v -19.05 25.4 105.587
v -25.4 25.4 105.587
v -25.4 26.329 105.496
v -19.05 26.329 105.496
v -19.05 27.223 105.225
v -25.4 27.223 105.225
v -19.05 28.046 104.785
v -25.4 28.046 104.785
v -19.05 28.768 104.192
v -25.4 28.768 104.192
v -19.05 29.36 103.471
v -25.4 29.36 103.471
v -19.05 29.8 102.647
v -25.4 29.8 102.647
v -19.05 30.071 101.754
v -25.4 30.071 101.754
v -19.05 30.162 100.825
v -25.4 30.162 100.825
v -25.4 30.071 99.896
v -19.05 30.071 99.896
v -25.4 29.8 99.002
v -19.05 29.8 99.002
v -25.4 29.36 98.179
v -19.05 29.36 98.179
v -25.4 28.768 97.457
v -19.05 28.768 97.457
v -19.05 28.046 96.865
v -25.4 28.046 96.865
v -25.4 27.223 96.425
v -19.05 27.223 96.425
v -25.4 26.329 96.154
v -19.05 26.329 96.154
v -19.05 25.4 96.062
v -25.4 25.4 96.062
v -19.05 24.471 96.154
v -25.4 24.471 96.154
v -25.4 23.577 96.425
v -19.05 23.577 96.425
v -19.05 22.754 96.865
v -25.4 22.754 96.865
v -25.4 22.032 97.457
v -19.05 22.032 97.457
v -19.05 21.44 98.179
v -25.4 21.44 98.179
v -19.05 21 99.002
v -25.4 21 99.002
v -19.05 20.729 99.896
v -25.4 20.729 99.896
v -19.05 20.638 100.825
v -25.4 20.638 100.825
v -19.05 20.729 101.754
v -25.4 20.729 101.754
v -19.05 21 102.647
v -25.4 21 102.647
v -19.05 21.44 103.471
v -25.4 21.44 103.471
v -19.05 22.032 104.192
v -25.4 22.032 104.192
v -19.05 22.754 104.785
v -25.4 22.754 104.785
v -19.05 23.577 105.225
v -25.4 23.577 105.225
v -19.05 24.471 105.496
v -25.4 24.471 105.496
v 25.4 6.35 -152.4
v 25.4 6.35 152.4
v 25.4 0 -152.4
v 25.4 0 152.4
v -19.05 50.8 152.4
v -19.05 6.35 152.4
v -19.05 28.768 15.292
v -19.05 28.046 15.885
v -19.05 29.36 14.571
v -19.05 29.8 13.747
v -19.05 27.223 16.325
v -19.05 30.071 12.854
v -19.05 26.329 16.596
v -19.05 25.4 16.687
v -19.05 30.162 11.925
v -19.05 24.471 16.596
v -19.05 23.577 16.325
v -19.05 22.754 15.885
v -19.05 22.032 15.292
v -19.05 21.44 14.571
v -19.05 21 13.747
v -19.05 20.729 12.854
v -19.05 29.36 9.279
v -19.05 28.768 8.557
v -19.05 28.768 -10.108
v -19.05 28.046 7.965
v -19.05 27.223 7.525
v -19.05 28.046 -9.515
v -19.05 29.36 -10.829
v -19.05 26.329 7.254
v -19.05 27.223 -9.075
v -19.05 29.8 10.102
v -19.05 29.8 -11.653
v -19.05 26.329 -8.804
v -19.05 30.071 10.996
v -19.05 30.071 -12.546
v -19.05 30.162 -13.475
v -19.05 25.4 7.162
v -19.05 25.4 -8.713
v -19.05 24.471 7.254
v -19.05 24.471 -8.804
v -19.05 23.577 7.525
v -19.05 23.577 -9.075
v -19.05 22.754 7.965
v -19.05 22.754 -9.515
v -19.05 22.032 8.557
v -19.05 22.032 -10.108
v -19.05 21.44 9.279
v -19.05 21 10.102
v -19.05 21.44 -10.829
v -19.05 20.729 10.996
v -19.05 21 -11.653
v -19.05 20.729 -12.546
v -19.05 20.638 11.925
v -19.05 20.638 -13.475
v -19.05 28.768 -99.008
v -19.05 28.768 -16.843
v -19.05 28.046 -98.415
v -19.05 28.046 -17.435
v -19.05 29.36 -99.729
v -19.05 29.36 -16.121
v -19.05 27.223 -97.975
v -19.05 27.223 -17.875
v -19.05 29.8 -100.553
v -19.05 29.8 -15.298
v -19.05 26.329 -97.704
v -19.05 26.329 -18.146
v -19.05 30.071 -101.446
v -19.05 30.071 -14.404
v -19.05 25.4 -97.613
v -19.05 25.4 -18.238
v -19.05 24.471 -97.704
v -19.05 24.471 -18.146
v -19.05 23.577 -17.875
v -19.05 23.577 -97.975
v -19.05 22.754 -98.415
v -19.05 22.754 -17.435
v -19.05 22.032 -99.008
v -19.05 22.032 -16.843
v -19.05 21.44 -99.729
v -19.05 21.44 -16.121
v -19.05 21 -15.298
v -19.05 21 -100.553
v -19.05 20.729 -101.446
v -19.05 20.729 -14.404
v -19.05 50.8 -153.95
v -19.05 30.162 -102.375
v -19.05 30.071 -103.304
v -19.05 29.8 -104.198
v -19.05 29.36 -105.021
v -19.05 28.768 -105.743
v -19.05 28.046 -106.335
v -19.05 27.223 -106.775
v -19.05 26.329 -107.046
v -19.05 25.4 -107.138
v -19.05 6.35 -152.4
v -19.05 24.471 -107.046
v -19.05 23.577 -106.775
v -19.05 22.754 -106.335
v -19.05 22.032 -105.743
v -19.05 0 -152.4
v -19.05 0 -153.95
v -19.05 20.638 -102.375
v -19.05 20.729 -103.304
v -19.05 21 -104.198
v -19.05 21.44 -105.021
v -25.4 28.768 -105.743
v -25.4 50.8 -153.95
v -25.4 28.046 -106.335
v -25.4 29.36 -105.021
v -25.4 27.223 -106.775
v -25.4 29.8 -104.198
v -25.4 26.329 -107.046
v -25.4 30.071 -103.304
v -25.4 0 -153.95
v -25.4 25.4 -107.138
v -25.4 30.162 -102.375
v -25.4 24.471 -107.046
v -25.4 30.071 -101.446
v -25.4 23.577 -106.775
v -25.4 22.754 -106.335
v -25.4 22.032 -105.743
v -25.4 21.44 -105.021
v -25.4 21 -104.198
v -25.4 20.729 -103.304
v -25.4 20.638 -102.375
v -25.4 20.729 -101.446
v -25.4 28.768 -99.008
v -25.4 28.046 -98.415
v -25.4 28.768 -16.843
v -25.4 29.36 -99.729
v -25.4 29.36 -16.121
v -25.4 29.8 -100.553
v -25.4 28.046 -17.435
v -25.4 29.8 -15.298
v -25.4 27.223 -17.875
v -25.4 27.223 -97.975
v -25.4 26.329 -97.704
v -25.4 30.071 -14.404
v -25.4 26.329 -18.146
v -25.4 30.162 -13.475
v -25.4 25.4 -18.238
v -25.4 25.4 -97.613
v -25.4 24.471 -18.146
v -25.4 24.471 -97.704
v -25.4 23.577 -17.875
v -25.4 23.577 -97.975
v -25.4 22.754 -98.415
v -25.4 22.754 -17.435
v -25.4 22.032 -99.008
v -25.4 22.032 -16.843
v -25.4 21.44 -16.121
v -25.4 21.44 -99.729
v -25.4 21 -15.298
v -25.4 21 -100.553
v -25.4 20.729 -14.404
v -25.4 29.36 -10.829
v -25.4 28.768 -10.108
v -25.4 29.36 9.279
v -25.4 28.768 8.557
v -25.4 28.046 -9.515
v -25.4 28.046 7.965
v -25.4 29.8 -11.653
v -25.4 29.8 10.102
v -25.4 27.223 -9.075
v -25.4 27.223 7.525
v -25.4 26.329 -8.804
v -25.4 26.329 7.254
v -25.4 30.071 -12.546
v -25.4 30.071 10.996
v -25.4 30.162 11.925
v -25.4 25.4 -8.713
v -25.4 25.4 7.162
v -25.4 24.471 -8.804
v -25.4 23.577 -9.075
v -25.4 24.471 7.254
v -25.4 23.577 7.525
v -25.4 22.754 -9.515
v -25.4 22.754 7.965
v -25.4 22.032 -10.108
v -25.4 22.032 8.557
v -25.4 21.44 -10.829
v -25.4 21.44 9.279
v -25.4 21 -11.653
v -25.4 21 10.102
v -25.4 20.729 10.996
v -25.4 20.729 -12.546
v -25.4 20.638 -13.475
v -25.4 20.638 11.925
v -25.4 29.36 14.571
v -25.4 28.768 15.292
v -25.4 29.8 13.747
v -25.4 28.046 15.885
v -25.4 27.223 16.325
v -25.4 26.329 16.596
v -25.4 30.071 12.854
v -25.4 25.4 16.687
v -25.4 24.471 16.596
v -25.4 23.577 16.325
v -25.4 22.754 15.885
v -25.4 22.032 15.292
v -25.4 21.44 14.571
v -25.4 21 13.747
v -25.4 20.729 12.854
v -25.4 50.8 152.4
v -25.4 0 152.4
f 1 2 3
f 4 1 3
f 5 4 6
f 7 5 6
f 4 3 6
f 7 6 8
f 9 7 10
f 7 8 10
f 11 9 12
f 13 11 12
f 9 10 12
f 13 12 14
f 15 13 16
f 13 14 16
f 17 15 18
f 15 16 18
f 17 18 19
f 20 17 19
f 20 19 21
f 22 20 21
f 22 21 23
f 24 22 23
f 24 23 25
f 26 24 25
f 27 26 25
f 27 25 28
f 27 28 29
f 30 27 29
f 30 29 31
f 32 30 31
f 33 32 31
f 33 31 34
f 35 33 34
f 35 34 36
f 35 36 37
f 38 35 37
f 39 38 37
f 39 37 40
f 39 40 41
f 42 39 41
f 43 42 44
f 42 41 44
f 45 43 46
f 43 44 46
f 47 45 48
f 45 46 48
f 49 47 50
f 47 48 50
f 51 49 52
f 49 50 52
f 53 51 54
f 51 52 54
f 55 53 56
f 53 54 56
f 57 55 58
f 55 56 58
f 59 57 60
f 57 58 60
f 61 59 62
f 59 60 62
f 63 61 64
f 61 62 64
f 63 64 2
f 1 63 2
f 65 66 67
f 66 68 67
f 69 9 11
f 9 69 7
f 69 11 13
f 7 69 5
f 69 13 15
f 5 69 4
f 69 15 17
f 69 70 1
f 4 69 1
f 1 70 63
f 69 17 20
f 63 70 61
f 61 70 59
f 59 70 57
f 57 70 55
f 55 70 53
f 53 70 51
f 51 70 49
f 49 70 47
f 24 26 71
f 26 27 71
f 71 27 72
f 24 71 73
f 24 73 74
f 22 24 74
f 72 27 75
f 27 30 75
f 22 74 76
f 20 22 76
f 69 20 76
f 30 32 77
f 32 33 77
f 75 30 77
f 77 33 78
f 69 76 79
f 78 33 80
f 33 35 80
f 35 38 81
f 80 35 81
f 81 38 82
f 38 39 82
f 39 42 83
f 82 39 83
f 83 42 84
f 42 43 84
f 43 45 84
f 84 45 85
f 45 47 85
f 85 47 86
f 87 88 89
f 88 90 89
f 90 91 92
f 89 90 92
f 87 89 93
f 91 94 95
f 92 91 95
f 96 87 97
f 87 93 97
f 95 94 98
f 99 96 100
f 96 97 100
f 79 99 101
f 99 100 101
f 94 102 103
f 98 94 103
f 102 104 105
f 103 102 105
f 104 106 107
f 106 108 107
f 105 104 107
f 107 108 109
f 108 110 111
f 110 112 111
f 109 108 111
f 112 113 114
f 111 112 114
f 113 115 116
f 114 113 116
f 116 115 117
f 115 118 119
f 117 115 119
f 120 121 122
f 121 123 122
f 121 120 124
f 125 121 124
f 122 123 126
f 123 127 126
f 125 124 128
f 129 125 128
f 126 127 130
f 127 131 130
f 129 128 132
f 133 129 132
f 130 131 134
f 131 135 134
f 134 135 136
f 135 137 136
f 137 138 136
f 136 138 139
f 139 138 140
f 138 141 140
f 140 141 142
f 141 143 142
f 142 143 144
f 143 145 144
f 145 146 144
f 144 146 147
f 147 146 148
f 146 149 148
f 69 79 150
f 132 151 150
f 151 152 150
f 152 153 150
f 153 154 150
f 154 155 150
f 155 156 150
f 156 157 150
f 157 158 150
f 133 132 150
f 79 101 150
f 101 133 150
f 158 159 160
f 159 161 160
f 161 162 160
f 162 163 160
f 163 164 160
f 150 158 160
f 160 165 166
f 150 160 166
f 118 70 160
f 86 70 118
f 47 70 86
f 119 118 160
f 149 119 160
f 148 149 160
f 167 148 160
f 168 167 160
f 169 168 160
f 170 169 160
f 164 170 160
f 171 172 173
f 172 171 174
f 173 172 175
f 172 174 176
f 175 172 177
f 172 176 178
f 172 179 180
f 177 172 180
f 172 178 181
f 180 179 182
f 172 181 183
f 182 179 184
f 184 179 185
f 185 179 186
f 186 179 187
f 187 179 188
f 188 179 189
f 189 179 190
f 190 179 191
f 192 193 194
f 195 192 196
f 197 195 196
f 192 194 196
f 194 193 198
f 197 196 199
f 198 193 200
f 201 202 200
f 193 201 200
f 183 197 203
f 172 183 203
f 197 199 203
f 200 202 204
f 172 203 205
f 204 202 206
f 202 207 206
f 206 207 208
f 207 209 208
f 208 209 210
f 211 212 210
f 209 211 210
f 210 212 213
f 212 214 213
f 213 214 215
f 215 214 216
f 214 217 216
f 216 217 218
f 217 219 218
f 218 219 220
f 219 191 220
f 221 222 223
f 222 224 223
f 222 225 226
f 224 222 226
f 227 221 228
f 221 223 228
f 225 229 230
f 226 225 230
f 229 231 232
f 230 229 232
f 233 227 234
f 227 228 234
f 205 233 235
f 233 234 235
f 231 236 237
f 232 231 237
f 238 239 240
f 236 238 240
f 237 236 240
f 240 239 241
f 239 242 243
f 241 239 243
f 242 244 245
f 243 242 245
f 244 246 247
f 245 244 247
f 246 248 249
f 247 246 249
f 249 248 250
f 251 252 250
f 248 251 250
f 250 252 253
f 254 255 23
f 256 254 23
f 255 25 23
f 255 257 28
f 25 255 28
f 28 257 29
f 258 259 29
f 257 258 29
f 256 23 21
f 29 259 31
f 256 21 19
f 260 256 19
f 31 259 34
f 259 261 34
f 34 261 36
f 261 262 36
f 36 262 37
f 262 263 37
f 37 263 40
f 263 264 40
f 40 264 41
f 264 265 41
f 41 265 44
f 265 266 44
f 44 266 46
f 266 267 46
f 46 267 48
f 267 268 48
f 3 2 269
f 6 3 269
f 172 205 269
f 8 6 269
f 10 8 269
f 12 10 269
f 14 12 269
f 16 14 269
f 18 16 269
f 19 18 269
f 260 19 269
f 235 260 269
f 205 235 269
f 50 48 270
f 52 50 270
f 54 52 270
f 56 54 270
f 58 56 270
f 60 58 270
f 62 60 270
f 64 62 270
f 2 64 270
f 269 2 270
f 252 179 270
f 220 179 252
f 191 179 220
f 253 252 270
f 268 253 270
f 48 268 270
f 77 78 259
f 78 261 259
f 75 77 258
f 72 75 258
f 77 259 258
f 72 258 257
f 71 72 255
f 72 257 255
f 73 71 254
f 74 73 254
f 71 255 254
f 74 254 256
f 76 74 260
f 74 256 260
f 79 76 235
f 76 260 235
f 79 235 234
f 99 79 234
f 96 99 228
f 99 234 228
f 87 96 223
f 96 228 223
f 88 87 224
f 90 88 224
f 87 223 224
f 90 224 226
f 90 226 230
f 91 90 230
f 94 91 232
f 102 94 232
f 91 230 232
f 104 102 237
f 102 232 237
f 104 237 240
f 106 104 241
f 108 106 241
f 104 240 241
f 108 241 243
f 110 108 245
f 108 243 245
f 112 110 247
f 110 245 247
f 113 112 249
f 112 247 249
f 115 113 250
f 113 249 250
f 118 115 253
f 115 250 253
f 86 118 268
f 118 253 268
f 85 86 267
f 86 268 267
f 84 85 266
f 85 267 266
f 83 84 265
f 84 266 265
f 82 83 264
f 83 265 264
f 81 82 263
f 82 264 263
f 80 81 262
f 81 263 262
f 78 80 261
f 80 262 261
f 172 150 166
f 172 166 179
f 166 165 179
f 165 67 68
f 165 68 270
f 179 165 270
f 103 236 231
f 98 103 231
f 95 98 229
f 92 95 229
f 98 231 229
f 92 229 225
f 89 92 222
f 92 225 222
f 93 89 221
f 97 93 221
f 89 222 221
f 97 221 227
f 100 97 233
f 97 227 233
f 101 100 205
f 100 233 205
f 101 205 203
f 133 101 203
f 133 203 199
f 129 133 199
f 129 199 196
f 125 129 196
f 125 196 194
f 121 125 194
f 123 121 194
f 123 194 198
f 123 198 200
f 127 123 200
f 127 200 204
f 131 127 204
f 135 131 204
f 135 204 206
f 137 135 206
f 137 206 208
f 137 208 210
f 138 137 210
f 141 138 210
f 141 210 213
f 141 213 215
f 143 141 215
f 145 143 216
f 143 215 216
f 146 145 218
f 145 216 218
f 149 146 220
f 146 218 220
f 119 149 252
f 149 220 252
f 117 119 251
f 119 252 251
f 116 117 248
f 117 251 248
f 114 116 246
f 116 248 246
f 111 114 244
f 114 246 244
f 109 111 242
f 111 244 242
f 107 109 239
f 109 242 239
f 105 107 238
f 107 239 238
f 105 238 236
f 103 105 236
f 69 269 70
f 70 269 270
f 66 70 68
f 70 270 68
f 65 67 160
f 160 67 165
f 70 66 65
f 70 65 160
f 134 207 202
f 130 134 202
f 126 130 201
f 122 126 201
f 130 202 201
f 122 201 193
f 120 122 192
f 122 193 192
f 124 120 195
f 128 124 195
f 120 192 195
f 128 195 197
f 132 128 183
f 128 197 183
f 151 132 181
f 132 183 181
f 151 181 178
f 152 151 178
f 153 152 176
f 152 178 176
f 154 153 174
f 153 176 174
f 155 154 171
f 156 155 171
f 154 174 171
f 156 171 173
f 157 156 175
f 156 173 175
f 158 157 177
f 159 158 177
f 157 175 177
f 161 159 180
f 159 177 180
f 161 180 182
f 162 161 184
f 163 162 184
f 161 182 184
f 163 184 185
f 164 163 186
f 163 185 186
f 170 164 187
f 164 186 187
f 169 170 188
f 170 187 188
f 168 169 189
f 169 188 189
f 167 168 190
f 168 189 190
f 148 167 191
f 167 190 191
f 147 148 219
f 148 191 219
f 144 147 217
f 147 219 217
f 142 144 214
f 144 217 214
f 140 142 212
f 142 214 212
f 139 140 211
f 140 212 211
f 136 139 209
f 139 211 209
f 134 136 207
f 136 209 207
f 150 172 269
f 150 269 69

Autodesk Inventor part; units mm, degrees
ref_plane "YZ Plane" through (0, 0, 0) normal (1, 0, 0) x (0, 1, 0)
ref_plane "XZ Plane" through (0, 0, 0) normal (0, 1, 0) x (-1, 0, 0)
ref_plane "XY Plane" through (0, 0, 0) normal (0, 0, 1) x (1, 0, 0)
sketch "Sketch1" plane through (0, 0, 0) normal (0, 1, 0) x (-1, 0, 0)
  line L0 (25.4, 152.4) -> (-25.4, 152.4)
  line L1 (-25.4, 152.4) -> (-25.4, -152.4)
  line L2 (-25.4, -152.4) -> (25.4, -152.4)
  line L3 (25.4, -152.4) -> (25.4, 152.4)
  point P0 (0, 0)
  dimension "d0" = 50.8
  dimension "d1" = 304.8
  dimension "d2" = 152.4
  dimension "d3" = 25.4
extrude "Extrusion1" add sketch "Sketch1" along normal blind 6.35
sketch "Sketch2" plane through (0, 0, 0) normal (0, -1, 0) x (1, 0, 0)
  line L0 (-25.4, -152.4) -> (-25.4, 152.4) projected
  line L1 (-25.4, 152.4) -> (-19.05, 152.4)
  line L2 (-19.05, 152.4) -> (-19.05, -153.9502)
  line L3 (-19.05, -153.9502) -> (-25.4, -153.9502)
  line L4 (-25.4, -153.9502) -> (-25.4, 152.4)
  point P0 (0, 0)
  dimension "d6" = 6.35
extrude "Extrusion2" add sketch "Sketch2" against normal blind 50.8
sketch "Sketch3" plane through (-25.4, 0, -153.9502) normal (-1, 0, 0) x (0, 0, 1)
  line L0 (153.9502, 0) -> (153.1751, 50.8) construction
  line L1 (0, 50.8) -> (306.3502, 50.8) construction
  line L2 (0, 0) -> (0, 50.8) construction
  line L3 (0, 25.4) -> (306.3502, 25.4) construction
  line L4 (306.3502, 0) -> (306.3502, 50.8) construction
  circle A0 centre (165.8751, 25.4) radius 4.7625
  circle A1 centre (254.7751, 25.4) radius 4.7625
  circle A2 centre (140.4751, 25.4) radius 4.7625
  circle A3 centre (51.5751, 25.4) radius 4.7625
  point P0 (153.1751, 25.4)
  dimension "d9" = 9.525
  dimension "d10" = 12.7
  dimension "d11" = 12.7
  dimension "d12" = 101.6
  dimension "d13" = 88.9
extrude "Extrusion3" cut sketch "Sketch3" against normal blind 50.8
equation "\"d2\" = 0.5 * d1"
equation "\"d3\" = 0.5 * d0"
equation "\"d11\" = d10"
properties part number "L-Bracket"
